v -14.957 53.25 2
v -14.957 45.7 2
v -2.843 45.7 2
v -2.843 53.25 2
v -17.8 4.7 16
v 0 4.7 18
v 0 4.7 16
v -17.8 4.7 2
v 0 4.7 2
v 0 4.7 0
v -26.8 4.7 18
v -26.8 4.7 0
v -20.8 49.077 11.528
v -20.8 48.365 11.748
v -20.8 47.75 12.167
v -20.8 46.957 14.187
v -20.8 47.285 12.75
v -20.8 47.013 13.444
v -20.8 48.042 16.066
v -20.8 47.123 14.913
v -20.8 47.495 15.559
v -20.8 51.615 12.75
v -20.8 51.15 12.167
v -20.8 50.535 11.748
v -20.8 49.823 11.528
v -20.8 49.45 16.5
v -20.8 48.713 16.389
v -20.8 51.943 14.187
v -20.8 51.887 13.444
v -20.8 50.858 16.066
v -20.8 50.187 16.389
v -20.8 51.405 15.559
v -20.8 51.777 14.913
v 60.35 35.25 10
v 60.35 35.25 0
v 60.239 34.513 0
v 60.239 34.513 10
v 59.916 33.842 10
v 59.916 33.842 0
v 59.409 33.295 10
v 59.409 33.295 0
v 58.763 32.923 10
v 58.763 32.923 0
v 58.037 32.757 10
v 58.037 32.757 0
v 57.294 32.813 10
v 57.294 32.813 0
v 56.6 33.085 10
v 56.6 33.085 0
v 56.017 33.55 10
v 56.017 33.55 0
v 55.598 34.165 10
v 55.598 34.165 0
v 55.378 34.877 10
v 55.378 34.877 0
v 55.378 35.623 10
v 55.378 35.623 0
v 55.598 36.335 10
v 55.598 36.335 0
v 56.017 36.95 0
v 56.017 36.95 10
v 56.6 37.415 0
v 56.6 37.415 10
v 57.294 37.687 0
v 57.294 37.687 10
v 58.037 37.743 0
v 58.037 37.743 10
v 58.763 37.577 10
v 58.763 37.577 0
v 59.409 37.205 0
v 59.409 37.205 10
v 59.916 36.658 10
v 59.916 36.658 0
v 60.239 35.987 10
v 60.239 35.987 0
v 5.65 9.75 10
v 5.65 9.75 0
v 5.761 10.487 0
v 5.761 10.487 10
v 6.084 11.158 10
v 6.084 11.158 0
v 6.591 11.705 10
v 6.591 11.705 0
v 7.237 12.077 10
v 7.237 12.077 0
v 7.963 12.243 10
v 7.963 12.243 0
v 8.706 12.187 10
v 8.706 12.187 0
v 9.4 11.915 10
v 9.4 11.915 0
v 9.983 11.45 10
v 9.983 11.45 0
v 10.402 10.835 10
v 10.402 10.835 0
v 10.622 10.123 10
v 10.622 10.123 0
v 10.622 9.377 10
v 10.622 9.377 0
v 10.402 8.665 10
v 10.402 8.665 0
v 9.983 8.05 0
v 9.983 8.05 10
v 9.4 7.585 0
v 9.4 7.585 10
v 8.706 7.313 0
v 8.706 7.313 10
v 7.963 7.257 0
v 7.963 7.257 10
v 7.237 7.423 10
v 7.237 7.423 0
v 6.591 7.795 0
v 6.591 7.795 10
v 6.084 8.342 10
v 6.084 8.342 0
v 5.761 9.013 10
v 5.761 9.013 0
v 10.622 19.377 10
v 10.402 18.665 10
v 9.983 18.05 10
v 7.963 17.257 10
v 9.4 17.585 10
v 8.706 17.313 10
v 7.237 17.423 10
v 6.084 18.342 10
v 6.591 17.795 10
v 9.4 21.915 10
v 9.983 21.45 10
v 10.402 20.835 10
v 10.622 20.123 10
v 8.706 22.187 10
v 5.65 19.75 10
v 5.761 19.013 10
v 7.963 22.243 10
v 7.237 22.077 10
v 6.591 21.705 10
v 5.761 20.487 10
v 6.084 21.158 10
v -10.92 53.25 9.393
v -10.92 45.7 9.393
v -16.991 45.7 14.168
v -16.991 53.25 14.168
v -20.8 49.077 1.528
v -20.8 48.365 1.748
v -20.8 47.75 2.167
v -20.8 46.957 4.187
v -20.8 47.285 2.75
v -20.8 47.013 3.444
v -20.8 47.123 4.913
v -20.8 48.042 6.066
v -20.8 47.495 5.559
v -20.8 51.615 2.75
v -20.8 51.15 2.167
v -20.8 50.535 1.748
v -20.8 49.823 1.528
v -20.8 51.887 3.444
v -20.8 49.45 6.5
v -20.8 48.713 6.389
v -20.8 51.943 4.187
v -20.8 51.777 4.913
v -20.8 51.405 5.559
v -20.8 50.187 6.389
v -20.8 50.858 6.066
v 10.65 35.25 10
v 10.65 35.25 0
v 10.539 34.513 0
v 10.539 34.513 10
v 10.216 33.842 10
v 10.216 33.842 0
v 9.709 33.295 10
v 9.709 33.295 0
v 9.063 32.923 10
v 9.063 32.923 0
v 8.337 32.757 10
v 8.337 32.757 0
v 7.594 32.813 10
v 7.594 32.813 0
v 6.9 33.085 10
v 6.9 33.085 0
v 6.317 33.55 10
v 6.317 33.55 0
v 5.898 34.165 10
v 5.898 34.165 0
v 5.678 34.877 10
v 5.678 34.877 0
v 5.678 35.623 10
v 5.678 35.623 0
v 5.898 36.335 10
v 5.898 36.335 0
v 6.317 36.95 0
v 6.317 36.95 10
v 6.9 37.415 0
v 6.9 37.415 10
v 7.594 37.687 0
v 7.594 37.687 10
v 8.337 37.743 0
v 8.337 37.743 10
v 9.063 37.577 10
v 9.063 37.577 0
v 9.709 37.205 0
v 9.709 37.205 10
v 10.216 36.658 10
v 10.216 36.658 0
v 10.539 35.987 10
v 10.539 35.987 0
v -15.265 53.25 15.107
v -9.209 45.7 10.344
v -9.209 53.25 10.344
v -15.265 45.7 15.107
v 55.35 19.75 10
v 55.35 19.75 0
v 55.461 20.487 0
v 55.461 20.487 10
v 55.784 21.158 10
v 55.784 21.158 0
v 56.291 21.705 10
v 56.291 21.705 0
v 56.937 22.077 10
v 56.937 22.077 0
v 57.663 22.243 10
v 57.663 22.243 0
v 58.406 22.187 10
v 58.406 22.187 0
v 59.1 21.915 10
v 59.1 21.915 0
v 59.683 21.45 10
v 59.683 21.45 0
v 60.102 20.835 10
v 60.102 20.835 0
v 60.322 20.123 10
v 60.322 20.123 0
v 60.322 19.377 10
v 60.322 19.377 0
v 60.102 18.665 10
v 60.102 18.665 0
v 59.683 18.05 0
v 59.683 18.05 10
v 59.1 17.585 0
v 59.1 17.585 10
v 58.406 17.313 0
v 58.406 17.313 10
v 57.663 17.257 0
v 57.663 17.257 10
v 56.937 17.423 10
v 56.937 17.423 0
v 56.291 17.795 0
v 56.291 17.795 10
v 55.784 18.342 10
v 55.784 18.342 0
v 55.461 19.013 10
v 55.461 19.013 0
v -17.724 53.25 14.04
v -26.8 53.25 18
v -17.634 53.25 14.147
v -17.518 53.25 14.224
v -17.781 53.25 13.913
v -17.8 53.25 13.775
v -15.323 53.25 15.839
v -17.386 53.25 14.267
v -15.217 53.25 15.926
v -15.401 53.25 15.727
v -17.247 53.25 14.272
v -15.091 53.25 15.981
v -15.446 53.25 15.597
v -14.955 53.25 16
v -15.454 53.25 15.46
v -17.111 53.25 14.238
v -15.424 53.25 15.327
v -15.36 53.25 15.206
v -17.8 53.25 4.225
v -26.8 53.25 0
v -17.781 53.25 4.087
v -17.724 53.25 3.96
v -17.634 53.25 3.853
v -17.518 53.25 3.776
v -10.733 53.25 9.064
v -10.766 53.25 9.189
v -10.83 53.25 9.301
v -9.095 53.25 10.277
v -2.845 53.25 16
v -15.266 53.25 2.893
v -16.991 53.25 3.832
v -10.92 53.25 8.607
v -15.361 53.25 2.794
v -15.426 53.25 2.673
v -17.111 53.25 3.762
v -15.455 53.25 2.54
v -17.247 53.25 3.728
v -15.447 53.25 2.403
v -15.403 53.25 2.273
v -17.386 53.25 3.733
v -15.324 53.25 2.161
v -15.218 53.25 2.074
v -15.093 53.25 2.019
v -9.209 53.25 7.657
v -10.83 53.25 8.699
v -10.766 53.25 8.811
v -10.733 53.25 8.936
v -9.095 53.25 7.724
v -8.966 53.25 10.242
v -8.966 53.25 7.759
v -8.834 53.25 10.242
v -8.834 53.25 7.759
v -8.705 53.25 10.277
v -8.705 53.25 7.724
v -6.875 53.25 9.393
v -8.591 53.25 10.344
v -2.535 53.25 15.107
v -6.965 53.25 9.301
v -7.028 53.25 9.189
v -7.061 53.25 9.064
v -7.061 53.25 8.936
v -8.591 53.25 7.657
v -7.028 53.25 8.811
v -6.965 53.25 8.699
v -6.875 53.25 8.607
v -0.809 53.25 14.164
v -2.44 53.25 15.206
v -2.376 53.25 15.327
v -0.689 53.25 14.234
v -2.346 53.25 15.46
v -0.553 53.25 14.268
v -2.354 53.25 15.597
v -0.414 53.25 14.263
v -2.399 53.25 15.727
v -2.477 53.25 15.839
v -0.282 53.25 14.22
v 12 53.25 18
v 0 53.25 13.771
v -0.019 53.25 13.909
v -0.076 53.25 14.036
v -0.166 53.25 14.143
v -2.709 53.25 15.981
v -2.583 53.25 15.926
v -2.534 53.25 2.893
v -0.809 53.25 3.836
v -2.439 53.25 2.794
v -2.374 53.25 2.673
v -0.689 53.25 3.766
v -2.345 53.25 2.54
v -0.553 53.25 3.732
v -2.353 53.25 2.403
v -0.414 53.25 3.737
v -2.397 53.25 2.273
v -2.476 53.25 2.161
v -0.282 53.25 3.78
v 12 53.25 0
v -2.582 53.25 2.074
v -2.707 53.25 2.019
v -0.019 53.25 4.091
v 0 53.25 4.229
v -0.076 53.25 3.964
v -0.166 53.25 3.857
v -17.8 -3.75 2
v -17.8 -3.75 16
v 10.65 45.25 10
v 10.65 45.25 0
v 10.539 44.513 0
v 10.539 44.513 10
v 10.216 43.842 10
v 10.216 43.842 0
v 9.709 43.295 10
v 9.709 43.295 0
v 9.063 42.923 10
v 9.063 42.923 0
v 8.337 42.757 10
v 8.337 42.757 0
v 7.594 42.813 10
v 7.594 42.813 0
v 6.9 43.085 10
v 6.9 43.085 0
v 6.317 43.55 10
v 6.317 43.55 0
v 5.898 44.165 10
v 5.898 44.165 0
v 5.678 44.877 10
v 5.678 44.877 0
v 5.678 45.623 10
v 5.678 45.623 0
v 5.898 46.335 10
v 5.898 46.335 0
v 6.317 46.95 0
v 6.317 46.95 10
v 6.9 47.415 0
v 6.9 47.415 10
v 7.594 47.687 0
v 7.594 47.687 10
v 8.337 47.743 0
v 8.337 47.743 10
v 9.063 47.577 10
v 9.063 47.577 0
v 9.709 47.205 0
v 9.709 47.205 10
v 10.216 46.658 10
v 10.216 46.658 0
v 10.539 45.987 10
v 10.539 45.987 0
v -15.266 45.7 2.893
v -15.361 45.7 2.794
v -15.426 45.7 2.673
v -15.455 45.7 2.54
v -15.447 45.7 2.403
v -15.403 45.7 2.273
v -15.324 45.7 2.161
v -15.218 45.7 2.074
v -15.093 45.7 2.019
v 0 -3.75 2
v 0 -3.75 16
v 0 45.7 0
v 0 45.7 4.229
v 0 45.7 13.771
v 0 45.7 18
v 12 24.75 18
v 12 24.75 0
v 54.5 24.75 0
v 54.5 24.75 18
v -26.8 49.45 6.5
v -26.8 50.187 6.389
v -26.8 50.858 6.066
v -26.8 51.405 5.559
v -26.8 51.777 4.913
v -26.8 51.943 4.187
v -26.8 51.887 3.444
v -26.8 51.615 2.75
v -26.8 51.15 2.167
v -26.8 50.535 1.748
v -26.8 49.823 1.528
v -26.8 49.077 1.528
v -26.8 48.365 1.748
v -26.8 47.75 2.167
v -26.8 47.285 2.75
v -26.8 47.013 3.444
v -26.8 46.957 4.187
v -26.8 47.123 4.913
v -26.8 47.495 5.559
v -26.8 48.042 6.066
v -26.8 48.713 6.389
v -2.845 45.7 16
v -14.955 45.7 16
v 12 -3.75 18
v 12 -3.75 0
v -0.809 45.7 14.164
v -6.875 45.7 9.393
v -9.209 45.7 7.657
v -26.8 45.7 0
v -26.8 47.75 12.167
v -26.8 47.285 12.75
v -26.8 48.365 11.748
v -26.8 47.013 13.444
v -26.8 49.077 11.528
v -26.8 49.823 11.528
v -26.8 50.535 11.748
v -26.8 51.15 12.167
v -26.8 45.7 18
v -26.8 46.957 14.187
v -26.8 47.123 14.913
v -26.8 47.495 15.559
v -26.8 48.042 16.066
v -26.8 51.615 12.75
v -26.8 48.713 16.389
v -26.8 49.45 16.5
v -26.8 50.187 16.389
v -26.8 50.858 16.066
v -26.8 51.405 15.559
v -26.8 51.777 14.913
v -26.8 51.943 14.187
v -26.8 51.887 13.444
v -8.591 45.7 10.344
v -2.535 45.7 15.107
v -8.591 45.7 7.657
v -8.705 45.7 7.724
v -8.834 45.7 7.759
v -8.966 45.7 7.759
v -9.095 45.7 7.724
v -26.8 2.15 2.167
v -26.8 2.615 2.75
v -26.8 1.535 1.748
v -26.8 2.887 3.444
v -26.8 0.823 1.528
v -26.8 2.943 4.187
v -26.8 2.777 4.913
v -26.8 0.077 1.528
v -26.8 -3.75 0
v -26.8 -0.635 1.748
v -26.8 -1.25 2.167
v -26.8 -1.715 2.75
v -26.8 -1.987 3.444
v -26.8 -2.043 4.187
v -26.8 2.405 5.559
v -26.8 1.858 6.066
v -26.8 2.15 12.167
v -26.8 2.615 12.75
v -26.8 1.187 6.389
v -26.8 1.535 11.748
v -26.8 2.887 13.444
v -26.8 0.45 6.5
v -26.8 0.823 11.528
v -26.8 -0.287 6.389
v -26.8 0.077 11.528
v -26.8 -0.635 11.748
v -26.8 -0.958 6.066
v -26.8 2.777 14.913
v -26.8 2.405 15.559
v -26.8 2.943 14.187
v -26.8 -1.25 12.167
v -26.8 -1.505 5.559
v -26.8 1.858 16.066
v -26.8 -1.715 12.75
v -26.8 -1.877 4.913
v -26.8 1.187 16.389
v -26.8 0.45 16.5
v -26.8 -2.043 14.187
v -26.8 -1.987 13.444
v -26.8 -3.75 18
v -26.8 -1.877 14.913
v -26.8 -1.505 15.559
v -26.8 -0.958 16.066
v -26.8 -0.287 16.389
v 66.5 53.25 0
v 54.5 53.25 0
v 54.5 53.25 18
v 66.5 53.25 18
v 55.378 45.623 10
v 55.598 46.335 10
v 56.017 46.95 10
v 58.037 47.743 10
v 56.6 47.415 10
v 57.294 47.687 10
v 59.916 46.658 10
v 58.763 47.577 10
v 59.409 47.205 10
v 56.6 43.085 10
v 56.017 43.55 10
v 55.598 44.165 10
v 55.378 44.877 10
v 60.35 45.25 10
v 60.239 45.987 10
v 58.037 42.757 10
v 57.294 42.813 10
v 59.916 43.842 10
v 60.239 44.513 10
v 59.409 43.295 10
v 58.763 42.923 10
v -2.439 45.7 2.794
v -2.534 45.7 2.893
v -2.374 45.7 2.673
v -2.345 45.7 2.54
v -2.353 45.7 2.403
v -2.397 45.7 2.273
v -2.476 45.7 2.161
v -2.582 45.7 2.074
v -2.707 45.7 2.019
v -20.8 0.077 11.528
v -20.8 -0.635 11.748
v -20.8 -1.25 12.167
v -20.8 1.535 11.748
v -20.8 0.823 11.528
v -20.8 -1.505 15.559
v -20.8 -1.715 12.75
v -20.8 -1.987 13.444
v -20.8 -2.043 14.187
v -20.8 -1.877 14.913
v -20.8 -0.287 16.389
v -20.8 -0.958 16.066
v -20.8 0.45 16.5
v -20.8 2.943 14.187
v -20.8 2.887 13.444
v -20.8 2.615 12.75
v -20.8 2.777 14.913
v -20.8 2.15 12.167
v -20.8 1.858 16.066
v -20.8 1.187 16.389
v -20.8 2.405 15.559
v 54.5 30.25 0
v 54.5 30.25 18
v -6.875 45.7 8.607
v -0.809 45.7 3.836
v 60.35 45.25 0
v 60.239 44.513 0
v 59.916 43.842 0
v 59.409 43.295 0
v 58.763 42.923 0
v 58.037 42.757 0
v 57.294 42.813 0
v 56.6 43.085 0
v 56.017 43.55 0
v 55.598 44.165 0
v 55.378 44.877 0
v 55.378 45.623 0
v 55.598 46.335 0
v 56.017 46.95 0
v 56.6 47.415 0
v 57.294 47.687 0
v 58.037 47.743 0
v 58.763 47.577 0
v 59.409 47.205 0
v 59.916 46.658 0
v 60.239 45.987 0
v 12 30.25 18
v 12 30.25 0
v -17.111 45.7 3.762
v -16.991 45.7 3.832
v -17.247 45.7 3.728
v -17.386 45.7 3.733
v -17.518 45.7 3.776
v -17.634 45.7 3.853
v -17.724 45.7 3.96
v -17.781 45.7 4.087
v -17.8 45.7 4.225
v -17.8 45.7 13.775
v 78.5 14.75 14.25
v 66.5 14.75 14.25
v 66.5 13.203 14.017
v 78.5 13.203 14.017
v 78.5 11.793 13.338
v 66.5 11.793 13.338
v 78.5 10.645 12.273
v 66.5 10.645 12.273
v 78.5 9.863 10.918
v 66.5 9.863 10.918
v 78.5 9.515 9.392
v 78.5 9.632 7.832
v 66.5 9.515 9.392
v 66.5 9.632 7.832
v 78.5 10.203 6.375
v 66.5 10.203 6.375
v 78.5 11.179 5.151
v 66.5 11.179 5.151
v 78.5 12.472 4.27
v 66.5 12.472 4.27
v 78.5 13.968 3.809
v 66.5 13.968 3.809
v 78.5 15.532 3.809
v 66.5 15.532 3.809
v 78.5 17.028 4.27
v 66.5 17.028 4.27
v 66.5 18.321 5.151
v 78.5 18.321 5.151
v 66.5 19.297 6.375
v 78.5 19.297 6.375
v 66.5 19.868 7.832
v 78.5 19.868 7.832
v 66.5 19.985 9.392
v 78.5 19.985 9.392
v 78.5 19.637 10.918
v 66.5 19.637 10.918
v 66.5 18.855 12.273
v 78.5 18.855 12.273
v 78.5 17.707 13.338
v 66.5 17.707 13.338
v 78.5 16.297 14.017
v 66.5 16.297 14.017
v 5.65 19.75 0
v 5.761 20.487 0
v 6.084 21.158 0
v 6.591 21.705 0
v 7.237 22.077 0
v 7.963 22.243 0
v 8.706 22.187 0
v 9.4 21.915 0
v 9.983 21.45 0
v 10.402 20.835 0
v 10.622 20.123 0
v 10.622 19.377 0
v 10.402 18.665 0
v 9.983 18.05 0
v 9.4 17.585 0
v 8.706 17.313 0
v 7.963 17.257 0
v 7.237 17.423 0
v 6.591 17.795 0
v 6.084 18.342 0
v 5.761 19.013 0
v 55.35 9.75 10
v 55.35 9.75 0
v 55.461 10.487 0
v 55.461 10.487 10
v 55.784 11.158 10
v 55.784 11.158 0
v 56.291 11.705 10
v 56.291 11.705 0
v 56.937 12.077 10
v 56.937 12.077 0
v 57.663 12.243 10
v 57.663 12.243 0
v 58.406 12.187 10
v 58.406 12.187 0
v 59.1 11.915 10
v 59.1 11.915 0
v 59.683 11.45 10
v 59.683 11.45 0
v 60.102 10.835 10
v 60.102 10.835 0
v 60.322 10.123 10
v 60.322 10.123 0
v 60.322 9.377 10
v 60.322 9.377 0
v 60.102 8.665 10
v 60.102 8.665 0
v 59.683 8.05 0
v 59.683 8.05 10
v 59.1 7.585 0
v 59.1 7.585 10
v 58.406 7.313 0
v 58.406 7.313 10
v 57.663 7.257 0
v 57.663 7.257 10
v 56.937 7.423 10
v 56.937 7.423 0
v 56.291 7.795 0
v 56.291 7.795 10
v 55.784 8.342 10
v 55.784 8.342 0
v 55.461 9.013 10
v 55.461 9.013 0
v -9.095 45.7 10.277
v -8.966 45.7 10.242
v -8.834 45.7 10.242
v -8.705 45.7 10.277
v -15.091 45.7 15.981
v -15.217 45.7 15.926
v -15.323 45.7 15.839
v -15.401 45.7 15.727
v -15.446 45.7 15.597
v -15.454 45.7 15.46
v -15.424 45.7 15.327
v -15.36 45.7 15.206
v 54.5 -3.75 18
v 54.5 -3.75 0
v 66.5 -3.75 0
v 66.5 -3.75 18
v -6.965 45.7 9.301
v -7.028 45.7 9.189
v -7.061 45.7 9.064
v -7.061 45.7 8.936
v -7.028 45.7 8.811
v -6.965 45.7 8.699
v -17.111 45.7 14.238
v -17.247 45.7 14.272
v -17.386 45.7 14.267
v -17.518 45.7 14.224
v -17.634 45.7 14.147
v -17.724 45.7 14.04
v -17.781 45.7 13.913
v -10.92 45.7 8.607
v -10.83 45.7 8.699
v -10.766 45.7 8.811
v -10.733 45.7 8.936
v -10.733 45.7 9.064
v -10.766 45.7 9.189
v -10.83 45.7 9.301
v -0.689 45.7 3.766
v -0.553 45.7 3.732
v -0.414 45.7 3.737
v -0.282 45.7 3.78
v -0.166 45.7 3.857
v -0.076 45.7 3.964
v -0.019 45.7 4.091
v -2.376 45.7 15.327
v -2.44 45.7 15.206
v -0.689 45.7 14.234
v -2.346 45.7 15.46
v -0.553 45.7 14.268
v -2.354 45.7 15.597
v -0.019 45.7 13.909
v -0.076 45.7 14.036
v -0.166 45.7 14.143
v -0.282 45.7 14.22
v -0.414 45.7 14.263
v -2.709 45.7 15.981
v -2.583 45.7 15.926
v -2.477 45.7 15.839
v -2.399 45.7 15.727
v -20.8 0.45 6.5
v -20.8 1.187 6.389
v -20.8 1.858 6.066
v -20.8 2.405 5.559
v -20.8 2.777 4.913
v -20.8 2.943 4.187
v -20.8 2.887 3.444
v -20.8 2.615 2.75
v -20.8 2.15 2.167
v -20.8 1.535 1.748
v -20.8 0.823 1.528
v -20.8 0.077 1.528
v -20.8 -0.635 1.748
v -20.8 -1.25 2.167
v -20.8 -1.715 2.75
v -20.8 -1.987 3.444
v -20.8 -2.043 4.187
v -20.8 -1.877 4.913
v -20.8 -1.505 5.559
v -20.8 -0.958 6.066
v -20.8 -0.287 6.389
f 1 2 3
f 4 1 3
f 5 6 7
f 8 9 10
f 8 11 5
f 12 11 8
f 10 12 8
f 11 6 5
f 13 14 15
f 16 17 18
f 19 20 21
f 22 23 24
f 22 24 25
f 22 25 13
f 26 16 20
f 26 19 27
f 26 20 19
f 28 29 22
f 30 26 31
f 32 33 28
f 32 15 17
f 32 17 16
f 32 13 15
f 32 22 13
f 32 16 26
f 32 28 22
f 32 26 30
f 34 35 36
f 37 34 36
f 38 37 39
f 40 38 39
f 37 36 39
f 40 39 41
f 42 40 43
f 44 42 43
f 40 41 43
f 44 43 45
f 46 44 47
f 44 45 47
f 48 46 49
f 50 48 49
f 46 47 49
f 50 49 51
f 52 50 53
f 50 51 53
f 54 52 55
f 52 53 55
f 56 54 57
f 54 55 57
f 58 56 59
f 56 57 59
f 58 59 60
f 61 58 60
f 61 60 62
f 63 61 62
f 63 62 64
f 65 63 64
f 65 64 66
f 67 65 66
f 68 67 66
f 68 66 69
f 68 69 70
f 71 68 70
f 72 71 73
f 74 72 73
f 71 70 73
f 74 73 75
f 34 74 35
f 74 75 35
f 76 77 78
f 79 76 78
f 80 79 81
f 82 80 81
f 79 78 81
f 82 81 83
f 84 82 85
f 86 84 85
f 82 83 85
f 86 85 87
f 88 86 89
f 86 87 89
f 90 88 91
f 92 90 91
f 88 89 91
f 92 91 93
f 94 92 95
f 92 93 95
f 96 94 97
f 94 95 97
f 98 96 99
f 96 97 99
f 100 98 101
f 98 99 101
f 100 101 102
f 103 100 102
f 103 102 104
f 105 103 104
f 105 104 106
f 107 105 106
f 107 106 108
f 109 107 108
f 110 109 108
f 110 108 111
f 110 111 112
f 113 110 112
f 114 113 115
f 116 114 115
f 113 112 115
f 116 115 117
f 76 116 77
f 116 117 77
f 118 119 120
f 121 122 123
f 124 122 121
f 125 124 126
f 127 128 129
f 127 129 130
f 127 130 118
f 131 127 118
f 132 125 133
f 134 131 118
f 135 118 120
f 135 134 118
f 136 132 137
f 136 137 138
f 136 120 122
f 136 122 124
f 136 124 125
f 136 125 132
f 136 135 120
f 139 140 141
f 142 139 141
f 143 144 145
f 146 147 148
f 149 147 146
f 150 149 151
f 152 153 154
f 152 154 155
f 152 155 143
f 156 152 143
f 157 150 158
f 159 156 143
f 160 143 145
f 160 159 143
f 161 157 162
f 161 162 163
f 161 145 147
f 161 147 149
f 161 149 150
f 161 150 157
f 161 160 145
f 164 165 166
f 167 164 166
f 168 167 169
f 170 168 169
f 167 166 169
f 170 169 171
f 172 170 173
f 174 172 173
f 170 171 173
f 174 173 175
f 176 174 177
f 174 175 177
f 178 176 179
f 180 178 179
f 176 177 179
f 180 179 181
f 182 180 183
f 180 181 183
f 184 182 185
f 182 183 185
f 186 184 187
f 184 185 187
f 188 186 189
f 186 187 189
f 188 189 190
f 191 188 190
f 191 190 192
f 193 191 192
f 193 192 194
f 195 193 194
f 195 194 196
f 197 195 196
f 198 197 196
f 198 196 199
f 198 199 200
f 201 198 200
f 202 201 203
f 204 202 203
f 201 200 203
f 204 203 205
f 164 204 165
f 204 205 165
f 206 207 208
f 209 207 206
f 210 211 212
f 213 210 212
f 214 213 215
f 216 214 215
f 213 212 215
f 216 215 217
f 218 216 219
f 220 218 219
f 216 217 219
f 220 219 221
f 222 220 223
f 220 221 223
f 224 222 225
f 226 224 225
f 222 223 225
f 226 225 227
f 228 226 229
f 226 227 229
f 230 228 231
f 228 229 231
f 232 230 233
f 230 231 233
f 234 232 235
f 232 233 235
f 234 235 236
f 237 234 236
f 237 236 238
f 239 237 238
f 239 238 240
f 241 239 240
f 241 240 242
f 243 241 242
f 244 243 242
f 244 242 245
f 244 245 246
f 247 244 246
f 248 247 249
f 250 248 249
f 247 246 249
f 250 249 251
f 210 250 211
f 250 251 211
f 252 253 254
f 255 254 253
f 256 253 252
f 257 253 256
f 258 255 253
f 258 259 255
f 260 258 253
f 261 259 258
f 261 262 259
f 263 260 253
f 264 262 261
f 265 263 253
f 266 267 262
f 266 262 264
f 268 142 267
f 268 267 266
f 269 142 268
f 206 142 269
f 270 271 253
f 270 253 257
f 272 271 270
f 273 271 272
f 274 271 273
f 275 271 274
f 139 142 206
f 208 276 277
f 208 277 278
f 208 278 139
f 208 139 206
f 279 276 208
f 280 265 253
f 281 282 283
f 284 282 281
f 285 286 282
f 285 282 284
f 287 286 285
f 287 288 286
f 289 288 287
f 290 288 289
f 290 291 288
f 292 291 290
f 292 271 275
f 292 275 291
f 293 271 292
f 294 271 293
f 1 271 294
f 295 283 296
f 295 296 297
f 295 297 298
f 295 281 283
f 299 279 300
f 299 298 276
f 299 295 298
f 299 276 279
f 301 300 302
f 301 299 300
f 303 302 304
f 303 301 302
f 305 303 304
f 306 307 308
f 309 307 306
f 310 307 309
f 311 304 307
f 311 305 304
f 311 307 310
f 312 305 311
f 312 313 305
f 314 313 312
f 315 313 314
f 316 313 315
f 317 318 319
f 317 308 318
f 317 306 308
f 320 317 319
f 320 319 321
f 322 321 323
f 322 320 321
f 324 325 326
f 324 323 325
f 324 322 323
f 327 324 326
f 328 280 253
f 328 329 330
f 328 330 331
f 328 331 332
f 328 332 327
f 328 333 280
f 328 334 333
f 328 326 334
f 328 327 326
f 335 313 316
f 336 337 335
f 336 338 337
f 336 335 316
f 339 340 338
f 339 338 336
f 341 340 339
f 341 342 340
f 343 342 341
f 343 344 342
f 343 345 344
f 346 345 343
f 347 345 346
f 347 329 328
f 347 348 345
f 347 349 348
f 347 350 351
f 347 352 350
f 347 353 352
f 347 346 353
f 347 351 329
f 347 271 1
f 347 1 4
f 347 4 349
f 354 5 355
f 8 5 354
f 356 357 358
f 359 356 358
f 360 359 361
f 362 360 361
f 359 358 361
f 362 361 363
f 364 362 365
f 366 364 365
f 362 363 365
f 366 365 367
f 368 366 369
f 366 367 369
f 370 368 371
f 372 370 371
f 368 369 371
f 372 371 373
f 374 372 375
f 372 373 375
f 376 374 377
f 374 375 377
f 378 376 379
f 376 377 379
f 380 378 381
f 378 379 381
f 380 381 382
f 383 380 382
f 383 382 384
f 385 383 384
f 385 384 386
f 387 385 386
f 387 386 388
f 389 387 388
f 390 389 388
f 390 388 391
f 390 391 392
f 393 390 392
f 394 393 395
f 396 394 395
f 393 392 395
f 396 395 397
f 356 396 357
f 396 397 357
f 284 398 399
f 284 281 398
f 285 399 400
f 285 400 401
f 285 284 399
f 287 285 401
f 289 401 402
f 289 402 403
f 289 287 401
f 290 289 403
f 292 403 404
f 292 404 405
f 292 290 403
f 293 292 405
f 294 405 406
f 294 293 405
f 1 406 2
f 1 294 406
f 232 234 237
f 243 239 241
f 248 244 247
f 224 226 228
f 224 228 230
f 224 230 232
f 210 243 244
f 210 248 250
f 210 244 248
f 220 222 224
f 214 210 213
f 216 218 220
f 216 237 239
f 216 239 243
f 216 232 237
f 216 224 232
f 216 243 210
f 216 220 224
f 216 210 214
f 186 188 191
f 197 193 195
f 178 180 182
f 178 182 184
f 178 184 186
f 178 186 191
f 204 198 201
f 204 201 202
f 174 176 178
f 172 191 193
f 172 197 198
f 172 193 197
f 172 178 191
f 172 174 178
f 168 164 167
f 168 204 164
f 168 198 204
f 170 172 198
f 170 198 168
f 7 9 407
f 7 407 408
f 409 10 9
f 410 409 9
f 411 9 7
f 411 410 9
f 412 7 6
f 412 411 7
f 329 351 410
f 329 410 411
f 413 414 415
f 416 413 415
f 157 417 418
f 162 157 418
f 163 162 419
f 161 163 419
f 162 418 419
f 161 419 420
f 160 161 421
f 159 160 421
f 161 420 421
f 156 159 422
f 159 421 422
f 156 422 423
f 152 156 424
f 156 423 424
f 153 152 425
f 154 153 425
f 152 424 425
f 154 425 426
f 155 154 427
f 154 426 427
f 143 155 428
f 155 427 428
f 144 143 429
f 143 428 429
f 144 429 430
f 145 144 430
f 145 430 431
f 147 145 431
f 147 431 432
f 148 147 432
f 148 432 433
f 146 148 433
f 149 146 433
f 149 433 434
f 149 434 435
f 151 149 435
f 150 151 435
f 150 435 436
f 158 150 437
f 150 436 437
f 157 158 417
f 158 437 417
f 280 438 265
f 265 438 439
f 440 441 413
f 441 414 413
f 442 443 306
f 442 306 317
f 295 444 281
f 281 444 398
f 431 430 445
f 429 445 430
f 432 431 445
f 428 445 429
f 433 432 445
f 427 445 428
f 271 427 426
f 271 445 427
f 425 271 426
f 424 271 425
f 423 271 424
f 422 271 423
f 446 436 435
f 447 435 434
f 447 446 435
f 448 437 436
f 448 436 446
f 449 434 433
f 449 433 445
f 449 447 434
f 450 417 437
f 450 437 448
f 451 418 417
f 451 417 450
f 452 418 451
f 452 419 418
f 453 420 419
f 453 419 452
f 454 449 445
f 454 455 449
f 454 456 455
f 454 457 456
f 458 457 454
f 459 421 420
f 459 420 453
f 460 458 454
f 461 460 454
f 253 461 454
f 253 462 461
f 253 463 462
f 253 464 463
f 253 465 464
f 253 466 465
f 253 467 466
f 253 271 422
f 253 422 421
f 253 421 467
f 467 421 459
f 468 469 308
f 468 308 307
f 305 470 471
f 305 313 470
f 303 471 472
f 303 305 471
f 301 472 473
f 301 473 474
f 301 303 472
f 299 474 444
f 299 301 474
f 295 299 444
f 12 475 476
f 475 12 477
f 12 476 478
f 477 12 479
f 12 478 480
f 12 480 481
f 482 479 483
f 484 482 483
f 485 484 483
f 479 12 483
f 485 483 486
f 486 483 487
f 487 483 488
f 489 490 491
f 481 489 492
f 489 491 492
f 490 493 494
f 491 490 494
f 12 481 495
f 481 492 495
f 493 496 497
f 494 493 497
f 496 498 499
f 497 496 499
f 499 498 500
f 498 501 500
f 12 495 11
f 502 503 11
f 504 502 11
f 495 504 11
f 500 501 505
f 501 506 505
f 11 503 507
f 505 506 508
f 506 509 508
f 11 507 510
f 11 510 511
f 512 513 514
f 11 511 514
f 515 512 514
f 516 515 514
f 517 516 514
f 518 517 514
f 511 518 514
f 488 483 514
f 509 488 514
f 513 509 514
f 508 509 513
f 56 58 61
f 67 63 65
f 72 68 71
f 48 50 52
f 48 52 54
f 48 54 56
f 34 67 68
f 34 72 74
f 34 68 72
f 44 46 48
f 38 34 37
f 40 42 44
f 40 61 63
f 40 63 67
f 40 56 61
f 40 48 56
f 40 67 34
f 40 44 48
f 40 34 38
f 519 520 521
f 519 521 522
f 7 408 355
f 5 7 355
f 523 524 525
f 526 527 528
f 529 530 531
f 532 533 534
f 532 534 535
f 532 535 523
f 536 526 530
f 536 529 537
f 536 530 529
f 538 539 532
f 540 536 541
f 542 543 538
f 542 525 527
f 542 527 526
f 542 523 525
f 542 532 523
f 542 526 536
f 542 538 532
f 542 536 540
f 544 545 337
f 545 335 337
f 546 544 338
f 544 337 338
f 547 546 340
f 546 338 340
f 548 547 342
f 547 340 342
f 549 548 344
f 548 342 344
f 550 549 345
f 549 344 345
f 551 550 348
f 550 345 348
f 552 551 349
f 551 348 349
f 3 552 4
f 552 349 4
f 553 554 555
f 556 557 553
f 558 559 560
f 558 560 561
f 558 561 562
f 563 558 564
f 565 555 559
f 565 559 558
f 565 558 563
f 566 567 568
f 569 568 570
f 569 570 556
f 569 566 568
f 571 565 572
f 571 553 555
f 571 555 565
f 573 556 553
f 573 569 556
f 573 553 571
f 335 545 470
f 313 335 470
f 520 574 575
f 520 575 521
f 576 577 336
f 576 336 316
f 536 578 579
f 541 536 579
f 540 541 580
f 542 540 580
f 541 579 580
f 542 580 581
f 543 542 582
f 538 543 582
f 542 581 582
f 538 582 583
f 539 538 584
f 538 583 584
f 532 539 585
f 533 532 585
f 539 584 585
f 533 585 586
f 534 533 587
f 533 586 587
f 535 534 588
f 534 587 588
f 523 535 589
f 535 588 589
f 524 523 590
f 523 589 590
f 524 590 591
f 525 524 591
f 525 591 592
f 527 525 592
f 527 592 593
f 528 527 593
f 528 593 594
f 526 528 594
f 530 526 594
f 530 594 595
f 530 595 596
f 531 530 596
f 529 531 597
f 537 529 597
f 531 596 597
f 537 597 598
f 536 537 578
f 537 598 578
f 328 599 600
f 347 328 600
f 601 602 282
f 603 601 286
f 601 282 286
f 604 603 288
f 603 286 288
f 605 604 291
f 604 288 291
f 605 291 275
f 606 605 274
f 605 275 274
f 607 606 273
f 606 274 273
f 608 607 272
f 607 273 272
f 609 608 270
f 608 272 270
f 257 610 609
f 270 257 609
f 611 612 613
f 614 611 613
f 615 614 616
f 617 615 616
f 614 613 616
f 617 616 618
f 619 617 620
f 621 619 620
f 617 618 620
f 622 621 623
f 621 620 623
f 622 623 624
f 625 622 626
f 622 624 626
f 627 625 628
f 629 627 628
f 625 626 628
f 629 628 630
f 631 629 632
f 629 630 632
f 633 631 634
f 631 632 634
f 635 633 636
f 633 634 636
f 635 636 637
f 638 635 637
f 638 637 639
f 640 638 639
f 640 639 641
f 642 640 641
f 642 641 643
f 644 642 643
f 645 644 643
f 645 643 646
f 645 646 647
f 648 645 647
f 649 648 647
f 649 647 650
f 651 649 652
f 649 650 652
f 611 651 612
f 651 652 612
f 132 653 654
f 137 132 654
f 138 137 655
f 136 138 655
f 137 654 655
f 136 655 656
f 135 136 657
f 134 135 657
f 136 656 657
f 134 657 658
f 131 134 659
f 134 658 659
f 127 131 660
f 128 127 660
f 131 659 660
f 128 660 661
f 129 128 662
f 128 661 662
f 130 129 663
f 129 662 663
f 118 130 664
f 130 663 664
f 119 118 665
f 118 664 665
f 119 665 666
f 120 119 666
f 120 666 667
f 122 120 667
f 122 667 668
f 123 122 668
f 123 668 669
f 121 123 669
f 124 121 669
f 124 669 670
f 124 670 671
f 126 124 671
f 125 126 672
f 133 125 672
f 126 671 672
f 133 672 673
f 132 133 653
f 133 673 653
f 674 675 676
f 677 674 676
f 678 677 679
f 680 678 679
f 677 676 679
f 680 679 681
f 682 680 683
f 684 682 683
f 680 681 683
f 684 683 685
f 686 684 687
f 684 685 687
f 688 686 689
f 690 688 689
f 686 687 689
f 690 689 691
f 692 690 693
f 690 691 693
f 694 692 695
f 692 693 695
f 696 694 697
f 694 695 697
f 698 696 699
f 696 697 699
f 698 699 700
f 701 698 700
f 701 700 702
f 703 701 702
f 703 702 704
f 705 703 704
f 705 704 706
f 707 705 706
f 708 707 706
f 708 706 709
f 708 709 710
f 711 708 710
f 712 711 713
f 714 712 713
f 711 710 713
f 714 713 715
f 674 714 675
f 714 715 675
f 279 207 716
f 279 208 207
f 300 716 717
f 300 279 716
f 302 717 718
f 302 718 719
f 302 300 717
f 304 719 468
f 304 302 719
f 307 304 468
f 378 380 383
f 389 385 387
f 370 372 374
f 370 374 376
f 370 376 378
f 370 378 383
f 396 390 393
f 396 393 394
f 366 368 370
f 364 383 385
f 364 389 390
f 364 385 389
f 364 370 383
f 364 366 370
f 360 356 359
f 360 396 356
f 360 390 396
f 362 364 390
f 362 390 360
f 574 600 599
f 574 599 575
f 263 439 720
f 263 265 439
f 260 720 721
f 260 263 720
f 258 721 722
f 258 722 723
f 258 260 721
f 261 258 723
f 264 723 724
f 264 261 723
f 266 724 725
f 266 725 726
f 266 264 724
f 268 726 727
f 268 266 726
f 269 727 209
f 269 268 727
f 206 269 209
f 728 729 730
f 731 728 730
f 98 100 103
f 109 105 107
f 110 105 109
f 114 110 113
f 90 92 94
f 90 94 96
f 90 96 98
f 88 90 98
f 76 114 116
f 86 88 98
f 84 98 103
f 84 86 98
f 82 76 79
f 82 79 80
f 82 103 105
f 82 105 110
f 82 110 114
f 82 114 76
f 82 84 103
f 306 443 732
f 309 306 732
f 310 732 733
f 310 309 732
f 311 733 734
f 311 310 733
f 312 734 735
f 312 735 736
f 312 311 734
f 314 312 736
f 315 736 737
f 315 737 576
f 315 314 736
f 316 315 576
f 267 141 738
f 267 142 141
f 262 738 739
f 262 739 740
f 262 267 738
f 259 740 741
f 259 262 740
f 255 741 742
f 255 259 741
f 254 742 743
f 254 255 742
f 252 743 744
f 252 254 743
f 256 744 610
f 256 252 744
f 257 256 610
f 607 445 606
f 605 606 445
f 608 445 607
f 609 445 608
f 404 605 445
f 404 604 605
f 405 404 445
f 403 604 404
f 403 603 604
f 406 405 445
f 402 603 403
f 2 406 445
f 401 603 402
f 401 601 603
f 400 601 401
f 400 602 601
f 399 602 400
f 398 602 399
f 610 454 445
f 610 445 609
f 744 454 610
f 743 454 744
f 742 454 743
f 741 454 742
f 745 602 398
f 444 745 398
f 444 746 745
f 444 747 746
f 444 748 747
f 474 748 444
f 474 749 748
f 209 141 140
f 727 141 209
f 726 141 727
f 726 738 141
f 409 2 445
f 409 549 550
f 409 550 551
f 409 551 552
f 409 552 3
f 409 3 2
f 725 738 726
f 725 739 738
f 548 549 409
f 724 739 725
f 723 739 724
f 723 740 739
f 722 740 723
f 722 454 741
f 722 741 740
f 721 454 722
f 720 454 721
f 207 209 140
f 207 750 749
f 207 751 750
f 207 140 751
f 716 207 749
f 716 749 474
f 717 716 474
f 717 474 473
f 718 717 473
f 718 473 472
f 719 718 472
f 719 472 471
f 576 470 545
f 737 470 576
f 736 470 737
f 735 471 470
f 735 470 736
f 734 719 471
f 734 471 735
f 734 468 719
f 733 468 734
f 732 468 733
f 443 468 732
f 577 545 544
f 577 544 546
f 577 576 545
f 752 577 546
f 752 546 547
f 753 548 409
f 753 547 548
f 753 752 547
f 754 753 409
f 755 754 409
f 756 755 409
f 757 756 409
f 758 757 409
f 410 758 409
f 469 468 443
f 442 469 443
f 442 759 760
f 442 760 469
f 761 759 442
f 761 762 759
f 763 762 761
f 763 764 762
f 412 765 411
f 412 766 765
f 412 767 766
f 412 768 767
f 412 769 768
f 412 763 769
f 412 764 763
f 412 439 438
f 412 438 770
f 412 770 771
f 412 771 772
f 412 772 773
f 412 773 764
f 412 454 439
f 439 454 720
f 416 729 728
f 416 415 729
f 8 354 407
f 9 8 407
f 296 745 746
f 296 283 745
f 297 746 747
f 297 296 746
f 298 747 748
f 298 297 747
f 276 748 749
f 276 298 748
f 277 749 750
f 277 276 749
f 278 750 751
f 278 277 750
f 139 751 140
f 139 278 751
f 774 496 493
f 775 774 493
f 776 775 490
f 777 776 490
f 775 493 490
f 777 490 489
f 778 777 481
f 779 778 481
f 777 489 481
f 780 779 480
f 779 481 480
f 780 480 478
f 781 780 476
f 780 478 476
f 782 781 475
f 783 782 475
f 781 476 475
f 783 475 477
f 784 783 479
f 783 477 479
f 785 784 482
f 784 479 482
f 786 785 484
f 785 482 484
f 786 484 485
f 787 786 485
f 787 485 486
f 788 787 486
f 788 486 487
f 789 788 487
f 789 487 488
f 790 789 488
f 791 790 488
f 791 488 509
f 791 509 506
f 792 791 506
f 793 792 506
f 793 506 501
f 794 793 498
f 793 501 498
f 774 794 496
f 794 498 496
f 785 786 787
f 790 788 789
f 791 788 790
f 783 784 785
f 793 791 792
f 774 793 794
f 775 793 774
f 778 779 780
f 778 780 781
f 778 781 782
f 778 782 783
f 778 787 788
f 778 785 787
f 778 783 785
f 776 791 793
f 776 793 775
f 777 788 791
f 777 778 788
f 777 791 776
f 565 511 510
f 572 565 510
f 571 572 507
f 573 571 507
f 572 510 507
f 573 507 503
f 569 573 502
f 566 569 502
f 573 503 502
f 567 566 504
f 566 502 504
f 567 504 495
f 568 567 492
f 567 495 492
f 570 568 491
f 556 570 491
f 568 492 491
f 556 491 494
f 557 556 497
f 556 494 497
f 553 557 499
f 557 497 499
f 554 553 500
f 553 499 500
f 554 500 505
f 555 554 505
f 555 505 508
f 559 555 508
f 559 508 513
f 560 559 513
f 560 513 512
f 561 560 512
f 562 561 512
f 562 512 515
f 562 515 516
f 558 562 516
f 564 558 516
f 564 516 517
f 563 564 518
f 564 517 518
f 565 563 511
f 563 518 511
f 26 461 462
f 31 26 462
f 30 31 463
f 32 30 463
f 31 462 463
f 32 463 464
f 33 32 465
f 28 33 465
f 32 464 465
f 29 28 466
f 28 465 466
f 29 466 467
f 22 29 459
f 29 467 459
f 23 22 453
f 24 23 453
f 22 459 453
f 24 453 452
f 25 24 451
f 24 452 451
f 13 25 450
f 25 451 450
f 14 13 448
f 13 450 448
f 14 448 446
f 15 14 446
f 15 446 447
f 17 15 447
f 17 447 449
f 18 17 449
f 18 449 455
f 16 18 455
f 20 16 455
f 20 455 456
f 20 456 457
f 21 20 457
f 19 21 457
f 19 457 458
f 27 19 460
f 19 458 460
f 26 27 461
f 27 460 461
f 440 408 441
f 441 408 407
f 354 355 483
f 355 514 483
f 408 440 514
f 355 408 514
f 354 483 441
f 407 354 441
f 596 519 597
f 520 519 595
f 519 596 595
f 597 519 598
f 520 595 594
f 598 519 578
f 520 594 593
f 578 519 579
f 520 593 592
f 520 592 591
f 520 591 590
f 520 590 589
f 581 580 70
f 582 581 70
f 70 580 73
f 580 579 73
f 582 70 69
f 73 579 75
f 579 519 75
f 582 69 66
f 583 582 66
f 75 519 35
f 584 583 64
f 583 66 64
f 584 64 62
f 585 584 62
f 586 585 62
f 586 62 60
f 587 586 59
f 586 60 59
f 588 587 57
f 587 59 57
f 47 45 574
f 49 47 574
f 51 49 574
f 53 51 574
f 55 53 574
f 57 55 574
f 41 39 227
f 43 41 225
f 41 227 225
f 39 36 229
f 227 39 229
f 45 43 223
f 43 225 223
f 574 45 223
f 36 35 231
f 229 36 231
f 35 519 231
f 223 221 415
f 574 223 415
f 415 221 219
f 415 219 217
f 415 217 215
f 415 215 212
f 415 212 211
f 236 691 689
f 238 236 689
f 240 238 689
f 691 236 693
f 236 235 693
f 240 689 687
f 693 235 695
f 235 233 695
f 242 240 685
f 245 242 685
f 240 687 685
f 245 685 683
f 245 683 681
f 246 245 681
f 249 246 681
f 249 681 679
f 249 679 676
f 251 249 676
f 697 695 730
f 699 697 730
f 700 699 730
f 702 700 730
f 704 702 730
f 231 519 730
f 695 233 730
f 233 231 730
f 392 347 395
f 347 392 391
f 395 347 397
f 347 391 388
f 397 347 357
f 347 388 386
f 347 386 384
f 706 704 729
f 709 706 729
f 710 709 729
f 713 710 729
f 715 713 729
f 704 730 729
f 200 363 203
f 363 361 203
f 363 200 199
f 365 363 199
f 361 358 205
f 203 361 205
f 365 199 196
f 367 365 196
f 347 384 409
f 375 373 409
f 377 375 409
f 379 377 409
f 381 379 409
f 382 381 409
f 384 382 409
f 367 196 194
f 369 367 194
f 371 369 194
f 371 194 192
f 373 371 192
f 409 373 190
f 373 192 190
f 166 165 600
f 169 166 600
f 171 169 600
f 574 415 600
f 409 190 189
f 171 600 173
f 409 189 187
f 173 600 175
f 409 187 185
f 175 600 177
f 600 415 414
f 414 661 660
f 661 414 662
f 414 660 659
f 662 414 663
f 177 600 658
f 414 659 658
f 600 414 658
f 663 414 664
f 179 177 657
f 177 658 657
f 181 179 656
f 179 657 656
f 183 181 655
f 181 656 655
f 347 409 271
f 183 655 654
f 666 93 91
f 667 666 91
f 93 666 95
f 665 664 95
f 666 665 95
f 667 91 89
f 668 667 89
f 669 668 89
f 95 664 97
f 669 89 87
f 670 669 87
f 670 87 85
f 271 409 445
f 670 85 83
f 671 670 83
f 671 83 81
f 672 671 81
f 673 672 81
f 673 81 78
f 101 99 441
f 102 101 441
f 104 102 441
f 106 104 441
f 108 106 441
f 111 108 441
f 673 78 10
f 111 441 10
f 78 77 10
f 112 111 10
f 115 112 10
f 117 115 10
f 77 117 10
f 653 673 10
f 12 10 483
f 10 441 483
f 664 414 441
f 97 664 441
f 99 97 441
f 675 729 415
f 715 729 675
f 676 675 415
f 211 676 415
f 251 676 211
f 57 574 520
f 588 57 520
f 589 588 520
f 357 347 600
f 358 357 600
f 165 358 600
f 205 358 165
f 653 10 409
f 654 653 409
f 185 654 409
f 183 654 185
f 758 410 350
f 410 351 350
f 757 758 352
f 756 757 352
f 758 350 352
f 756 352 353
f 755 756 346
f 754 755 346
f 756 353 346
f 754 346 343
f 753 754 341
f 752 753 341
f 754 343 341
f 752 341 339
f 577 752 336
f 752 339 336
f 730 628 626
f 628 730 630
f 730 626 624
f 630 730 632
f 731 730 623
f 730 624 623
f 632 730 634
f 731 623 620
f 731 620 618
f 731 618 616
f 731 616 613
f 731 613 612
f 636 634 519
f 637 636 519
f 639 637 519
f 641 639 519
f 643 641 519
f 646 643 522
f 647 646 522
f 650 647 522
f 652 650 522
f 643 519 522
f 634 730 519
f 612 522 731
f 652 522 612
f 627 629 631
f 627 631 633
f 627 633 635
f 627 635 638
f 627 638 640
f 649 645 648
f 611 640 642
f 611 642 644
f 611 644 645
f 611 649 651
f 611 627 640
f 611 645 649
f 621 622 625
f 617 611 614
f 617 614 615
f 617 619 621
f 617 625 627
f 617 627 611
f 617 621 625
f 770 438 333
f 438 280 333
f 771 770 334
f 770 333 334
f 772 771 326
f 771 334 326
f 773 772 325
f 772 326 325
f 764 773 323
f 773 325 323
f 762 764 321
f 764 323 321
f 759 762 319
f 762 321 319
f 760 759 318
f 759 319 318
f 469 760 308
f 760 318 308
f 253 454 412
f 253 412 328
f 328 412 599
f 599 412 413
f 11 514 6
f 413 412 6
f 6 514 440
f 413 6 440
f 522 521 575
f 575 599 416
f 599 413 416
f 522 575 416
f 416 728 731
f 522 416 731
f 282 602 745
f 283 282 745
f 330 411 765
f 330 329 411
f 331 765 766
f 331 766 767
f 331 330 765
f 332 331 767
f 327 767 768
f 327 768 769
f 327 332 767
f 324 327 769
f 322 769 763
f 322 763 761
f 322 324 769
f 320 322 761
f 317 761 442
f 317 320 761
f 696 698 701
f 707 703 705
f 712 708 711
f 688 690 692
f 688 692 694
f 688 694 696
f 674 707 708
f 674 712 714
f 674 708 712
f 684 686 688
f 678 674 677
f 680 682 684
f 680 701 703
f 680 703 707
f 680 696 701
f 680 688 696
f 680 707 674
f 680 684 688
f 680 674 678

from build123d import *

# Parameters (mm, degrees)
SKETCH2_W                = 66.5
SKETCH2_H                = 55
SKETCH2_W_2              = 42.5
SKETCH2_H_2              = 20.5
BOSS_EXTRUDE1_DEPTH      = 18
SKETCH5_W                = 2
SKETCH5_H                = 6
BOSS_EXTRUDE2_DEPTH      = 26.8
BOSS_EXTRUDE3_REACH      = 89.768
SKETCH6_W                = 3
SKETCH6_H                = 6
SKETCH6_W_2              = 2
CUT_EXTRUDE3_REACH       = 90.155
SKETCH8_W                = 42
SKETCH8_H                = 4.25
SKETCH8_W_2              = 42.5
SKETCH12_W               = 3
SKETCH12_H               = 6
BOSS_EXTRUDE7_DEPTH      = 14
SKETCH14_W               = 4
SKETCH14_H               = 6
BOSS_EXTRUDE8_DEPTH      = 16.8
BOSS_EXTRUDE9_DEPTH      = 14
BOSS_EXTRUDE9_DEPTH_BACK = 1
SKETCH17_W               = 23.8
SKETCH17_H               = 6
SKETCH18_W               = 19.8
SKETCH18_H               = 14
CUT_EXTRUDE4_DEPTH       = 10
SKETCH20_W               = 5
SKETCH20_H               = 14
BOSS_EXTRUDE10_DEPTH     = 6
SKETCH22_W               = 38.8
SKETCH22_H               = 18
BOSS_EXTRUDE11_DEPTH     = 1
SKETCH23_W               = 26.8
SKETCH23_H               = 18
BOSS_EXTRUDE12_DEPTH     = 1
BOSS_EXTRUDE13_DEPTH     = 1
SKETCH25_W               = 12
SKETCH25_H               = 18
BOSS_EXTRUDE14_DEPTH     = 1
SKETCH27_W               = 38.8
SKETCH27_H               = 18
SKETCH27_W_2             = 19.8
SKETCH27_H_2             = 14
BOSS_EXTRUDE15_DEPTH     = 1
SKETCH28_W               = 12
SKETCH28_H               = 18
BOSS_EXTRUDE16_DEPTH     = 1
SKETCH32_W               = 18
SKETCH32_H               = 2.75
CUT_EXTRUDE8_DEPTH       = 26.8
SKETCH33_W               = 38.8
SKETCH33_H               = 18
SKETCH33_W_2             = 19.8
SKETCH33_H_2             = 14
BOSS_EXTRUDE17_DEPTH     = 2.75
SKETCH34_W               = 12
SKETCH34_H               = 18
BOSS_EXTRUDE18_DEPTH     = 2.75
SKETCH35_W               = 26.8
SKETCH35_H               = 18
BOSS_EXTRUDE19_DEPTH     = 2.3
SKETCH36_W               = 12
SKETCH36_H               = 18
SKETCH36_W_2             = 38.8
CUT_EXTRUDE9_DEPTH       = 2.75
SKETCH37_R               = 2.5
CUT_EXTRUDE10_DEPTH      = 6
SKETCH39_R               = 2.5
CUT_EXTRUDE12_DEPTH      = 10
SKETCH38_R               = 2.5
CUT_EXTRUDE11_DEPTH      = 6
SKETCH40_W               = 0.5
SKETCH40_H               = 4.25
CUT_EXTRUDE13_DEPTH      = 18
BOSS_EXTRUDE21_DEPTH     = 0.45
SKETCH44_R               = 5.25
BOSS_EXTRUDE22_DEPTH     = 12
SKETCH45_W               = 14
SKETCH45_H               = 8.45
BOSS_EXTRUDE23_DEPTH     = 2
CUT_EXTRUDE14_DEPTH      = 95.506891283
FILLET1_R                = 0.5


with BuildPart() as part:
    # Sketch2 → Boss-Extrude1 (new body)
    with BuildSketch(Plane.XY):
        with Locations((33.25, 27.5)):
            Rectangle(SKETCH2_W, SKETCH2_H)
        with Locations((33.25, 40.5)):
            Rectangle(SKETCH2_W_2, SKETCH2_H_2, mode=Mode.SUBTRACT)
        with Locations((33.25, 14.5)):
            Rectangle(SKETCH2_W_2, SKETCH2_H_2, mode=Mode.SUBTRACT)
    extrude(amount=BOSS_EXTRUDE1_DEPTH)

    # Sketch5 → Boss-Extrude2 (add)
    with BuildSketch(Plane.ZY):
        with Locations((1, 52)):
            Rectangle(SKETCH5_W, SKETCH5_H)
        with Locations((17, 52)):
            Rectangle(SKETCH5_W, SKETCH5_H)
        with Locations((1, 3)):
            Rectangle(SKETCH5_W, SKETCH5_H)
        with Locations((17, 3)):
            Rectangle(SKETCH5_W, SKETCH5_H)
    extrude(amount=BOSS_EXTRUDE2_DEPTH)

    # Sketch6 → Boss-Extrude3 (add, up to next)
    with BuildSketch(Plane.XY.offset(2), mode=Mode.PRIVATE) as boss_extrude3_sk1:
        with Locations((-25.3, 52)):
            Rectangle(SKETCH6_W, SKETCH6_H)
    boss_extrude3_tool1 = extrude(boss_extrude3_sk1.sketch, amount=BOSS_EXTRUDE3_REACH, mode=Mode.PRIVATE) - part.part
    # Sketch6 → Boss-Extrude3 (add, up to next)
    with BuildSketch(Plane.XY.offset(2), mode=Mode.PRIVATE) as boss_extrude3_sk2:
        with Locations((-25.8, 3)):
            Rectangle(SKETCH6_W_2, SKETCH6_H)
    boss_extrude3_tool2 = extrude(boss_extrude3_sk2.sketch, amount=BOSS_EXTRUDE3_REACH, mode=Mode.PRIVATE) - part.part
    add(boss_extrude3_tool1.solids().sort_by_distance((-25.3, 52, 2))[0])
    add(boss_extrude3_tool2.solids().sort_by_distance((-25.8, 3, 2))[0])

    # Sketch8 → Cut-Extrude3 (cut, up to next)
    with BuildSketch(Plane.XY.offset(18), mode=Mode.PRIVATE) as cut_extrude3_sk1:
        with Locations((33, 52.875)):
            Rectangle(SKETCH8_W, SKETCH8_H)
    cut_extrude3_tool1 = extrude(cut_extrude3_sk1.sketch, amount=-CUT_EXTRUDE3_REACH, mode=Mode.PRIVATE) & part.part
    # Sketch8 → Cut-Extrude3 (cut, up to next)
    with BuildSketch(Plane.XY.offset(18), mode=Mode.PRIVATE) as cut_extrude3_sk2:
        with Locations((33.25, 2.125)):
            Rectangle(SKETCH8_W_2, SKETCH8_H)
    cut_extrude3_tool2 = extrude(cut_extrude3_sk2.sketch, amount=-CUT_EXTRUDE3_REACH, mode=Mode.PRIVATE) & part.part
    add(cut_extrude3_tool1.solids().sort_by_distance((33, 52.875, 18))[0], mode=Mode.SUBTRACT)
    add(cut_extrude3_tool2.solids().sort_by_distance((33.25, 2.125, 18))[0], mode=Mode.SUBTRACT)

    # Sketch12 → Boss-Extrude7 (add)
    with BuildSketch(Plane.XY.offset(2)):
        with Locations((-6.5, 3)):
            Rectangle(SKETCH12_W, SKETCH12_H)
    extrude(amount=BOSS_EXTRUDE7_DEPTH)

    # Sketch14 → Boss-Extrude8 (add)
    with BuildSketch(Plane.ZY.offset(8)):
        with Locations((9, 3)):
            Rectangle(SKETCH14_W, SKETCH14_H)
    extrude(amount=BOSS_EXTRUDE8_DEPTH)

    # Sketch17 → Boss-Extrude9 (add, two sides: drawn at the far end of the back side and taken through both)
    with BuildSketch(Plane.XY.offset(2).offset(-BOSS_EXTRUDE9_DEPTH_BACK)):
        with Locations((-11.9, 52)):
            Rectangle(SKETCH17_W, SKETCH17_H)
    extrude(amount=BOSS_EXTRUDE9_DEPTH + BOSS_EXTRUDE9_DEPTH_BACK)

    # Sketch18 → Cut-Extrude4 (cut)
    with BuildSketch(Plane(origin=(0, 6, 0), x_dir=(1, 0, 0), z_dir=(0, 1, 0))):
        with Locations((-14.9, -9)):
            Rectangle(SKETCH18_W, SKETCH18_H)
    extrude(amount=-CUT_EXTRUDE4_DEPTH, mode=Mode.SUBTRACT)

    # Sketch20 → Boss-Extrude10 (add)
    with BuildSketch(Plane(origin=(0, 6, 0), x_dir=(1, 0, 0), z_dir=(0, 1, 0))):
        with Locations((-22.3, -9)):
            Rectangle(SKETCH20_W, SKETCH20_H)
    extrude(amount=-BOSS_EXTRUDE10_DEPTH)

    # Sketch22 → Boss-Extrude11 (add)
    with BuildSketch(Plane(origin=(0, 55, 0), x_dir=(1, 0, 0), z_dir=(0, 1, 0))):
        with Locations((-7.4, -9)):
            Rectangle(SKETCH22_W, SKETCH22_H)
    extrude(amount=BOSS_EXTRUDE11_DEPTH)

    # Sketch23 → Boss-Extrude12 (add)
    with BuildSketch(Plane.XZ.offset(-49)):
        with Locations((-13.4, 9)):
            Rectangle(SKETCH23_W, SKETCH23_H)
    extrude(amount=BOSS_EXTRUDE12_DEPTH)

    # Sketch24 → Boss-Extrude13 (add)
    with BuildSketch(Plane(origin=(0, 6, 0), x_dir=(1, 0, 0), z_dir=(0, 1, 0))):
        Polygon((0, 0), (-26.8, 0), (-26.8, -18), (0, -18), (0, -16), (-19.8, -16), (-19.8, -2), (0, -2), align=None)
    extrude(amount=BOSS_EXTRUDE13_DEPTH)

    # Sketch25 → Boss-Extrude14 (add)
    with BuildSketch(Plane(origin=(0, 55, 0), x_dir=(1, 0, 0), z_dir=(0, 1, 0))):
        with Locations((60.5, -9)):
            Rectangle(SKETCH25_W, SKETCH25_H)
    extrude(amount=BOSS_EXTRUDE14_DEPTH)

    # Sketch27 → Boss-Extrude15 (add)
    with BuildSketch(Plane.XZ):
        with Locations((-7.4, 9)):
            Rectangle(SKETCH27_W, SKETCH27_H)
        with Locations((-9.9, 9)):
            Rectangle(SKETCH27_W_2, SKETCH27_H_2, mode=Mode.SUBTRACT)
    extrude(amount=BOSS_EXTRUDE15_DEPTH)

    # Sketch28 → Boss-Extrude16 (add)
    with BuildSketch(Plane.XZ):
        with Locations((60.5, 9)):
            Rectangle(SKETCH28_W, SKETCH28_H)
    extrude(amount=BOSS_EXTRUDE16_DEPTH)

    # Sketch32 → Cut-Extrude8 (cut)
    with BuildSketch(Plane.ZY.offset(26.8)):
        with Locations((9, 5.625)):
            Rectangle(SKETCH32_W, SKETCH32_H)
    extrude(amount=-CUT_EXTRUDE8_DEPTH, mode=Mode.SUBTRACT)

    # Sketch33 → Boss-Extrude17 (add)
    with BuildSketch(Plane.XZ.offset(1)):
        with Locations((-7.4, 9)):
            Rectangle(SKETCH33_W, SKETCH33_H)
        with Locations((-9.9, 9)):
            Rectangle(SKETCH33_W_2, SKETCH33_H_2, mode=Mode.SUBTRACT)
    extrude(amount=BOSS_EXTRUDE17_DEPTH)

    # Sketch34 → Boss-Extrude18 (add)
    with BuildSketch(Plane.XZ.offset(1)):
        with Locations((60.5, 9)):
            Rectangle(SKETCH34_W, SKETCH34_H)
    extrude(amount=BOSS_EXTRUDE18_DEPTH)

    # Sketch35 → Boss-Extrude19 (add)
    with BuildSketch(Plane.XZ.offset(-48)):
        with Locations((-13.4, 9)):
            Rectangle(SKETCH35_W, SKETCH35_H)
    extrude(amount=BOSS_EXTRUDE19_DEPTH)

    # Sketch36 → Cut-Extrude9 (cut)
    with BuildSketch(Plane(origin=(0, 56, 0), x_dir=(1, 0, 0), z_dir=(0, 1, 0))):
        with Locations((60.5, -9)):
            Rectangle(SKETCH36_W, SKETCH36_H)
        with Locations((-7.4, -9)):
            Rectangle(SKETCH36_W_2, SKETCH36_H)
    extrude(amount=-CUT_EXTRUDE9_DEPTH, mode=Mode.SUBTRACT)

    # Sketch37 → Cut-Extrude10 (cut)
    with BuildSketch(Plane.ZY.offset(26.8)):
        with Locations((4, 49.45)):
            Circle(SKETCH37_R)
        with Locations((14, 49.45)):
            Circle(SKETCH37_R)
    extrude(amount=-CUT_EXTRUDE10_DEPTH, mode=Mode.SUBTRACT)

    # Sketch39 → Cut-Extrude12 (cut)
    with BuildSketch(Plane(origin=(0, 0, 0), x_dir=(-1, 0, 0), z_dir=(0, 0, -1))):
        with Locations((-8.15, 19.75)):
            Circle(SKETCH39_R)
        with Locations((-8.15, 9.75)):
            Circle(SKETCH39_R)
        with Locations((-57.85, 19.75)):
            Circle(SKETCH39_R)
        with Locations((-57.85, 9.75)):
            Circle(SKETCH39_R)
        with Locations(Location((-8.15, 45.25, 0), (0, 0, 180))):
            Circle(SKETCH39_R)
        with Locations(Location((-8.15, 35.25, 0), (0, 0, 180))):
            Circle(SKETCH39_R)
        with Locations(Location((-57.85, 45.25, 0), (0, 0, 180))):
            Circle(SKETCH39_R)
        with Locations(Location((-57.85, 35.25, 0), (0, 0, 180))):
            Circle(SKETCH39_R)
    extrude(amount=-CUT_EXTRUDE12_DEPTH, mode=Mode.SUBTRACT)

    # Sketch38 → Cut-Extrude11 (cut)
    with BuildSketch(Plane.ZY.offset(26.8)):
        with Locations((4, 0.45)):
            Circle(SKETCH38_R)
        with Locations((14, 0.45)):
            Circle(SKETCH38_R)
    extrude(amount=-CUT_EXTRUDE11_DEPTH, mode=Mode.SUBTRACT)

    # Sketch40 → Cut-Extrude13 (cut)
    with BuildSketch(Plane(origin=(0, 0, 0), x_dir=(-1, 0, 0), z_dir=(0, 0, -1))):
        with Locations((-54.25, 52.875)):
            Rectangle(SKETCH40_W, SKETCH40_H)
    extrude(amount=-CUT_EXTRUDE13_DEPTH, mode=Mode.SUBTRACT)

    # Sketch43 → Boss-Extrude21 (add)
    with BuildSketch(Plane(origin=(0, 4.25, 0), x_dir=(1, 0, 0), z_dir=(0, 1, 0))):
        Polygon((0, 0), (-26.8, 0), (-26.8, -18), (0, -18), (0, -16), (-19.8, -16), (-19.8, -2), (0, -2), align=None)
    extrude(amount=BOSS_EXTRUDE21_DEPTH)

    # Sketch44 → Boss-Extrude22 (add)
    with BuildSketch(Plane(origin=(66.5, 0, 0), x_dir=(0, 0, -1), z_dir=(1, 0, 0))):
        with Locations(Location((-9, 14.75, 0), (0, 0, 180))):
            Circle(SKETCH44_R)
    extrude(amount=BOSS_EXTRUDE22_DEPTH)

    # Sketch45 → Boss-Extrude23 (add)
    with BuildSketch(Plane(origin=(-19.8, 0, 0), x_dir=(0, 0, -1), z_dir=(1, 0, 0))):
        with Locations((-9, 0.475)):
            Rectangle(SKETCH45_W, SKETCH45_H)
    extrude(amount=BOSS_EXTRUDE23_DEPTH)

    # Sketch48 → Cut-Extrude14 (cut, through all)
    with BuildSketch(Plane(origin=(0, 45.7, 0), x_dir=(-1, 0, 0), z_dir=(0, -1, 0))):
        Polygon((8.9, -16), (1.4, -16), (8.9, -10.101152658), (16.399963049, -16), align=None)
        Polygon((1.398571429, -2), (8.9, -7.9), (16.401428571, -2), align=None)
        Polygon((0, -3.2), (7.374285714, -9), (0, -14.8), align=None)
        Polygon((17.8, -3.195910825), (10.420515192, -9), (17.8, -14.804089175), align=None)
    extrude(amount=-CUT_EXTRUDE14_DEPTH, mode=Mode.SUBTRACT)

    # Fillet1
    fillet1_edges = [part.edges().sort_by_distance(p)[0] for p in [
        (0, 49.475, 14.8),
        (0, 49.475, 3.2),
        (-7.374285714, 49.475, 9),
        (-17.8, 49.475, 14.804089175),
        (-10.420515192, 49.475, 9),
        (-17.8, 49.475, 3.195910825),
        (-8.9, 49.475, 10.101152658),
        (-16.399963049, 49.475, 16),
        (-1.4, 49.475, 16),
        (-16.401428571, 49.475, 2),
        (-8.9, 49.475, 7.9),
        (-1.398571429, 49.475, 2),
    ]]
    fillet(fillet1_edges, radius=FILLET1_R)


solid = part.part
